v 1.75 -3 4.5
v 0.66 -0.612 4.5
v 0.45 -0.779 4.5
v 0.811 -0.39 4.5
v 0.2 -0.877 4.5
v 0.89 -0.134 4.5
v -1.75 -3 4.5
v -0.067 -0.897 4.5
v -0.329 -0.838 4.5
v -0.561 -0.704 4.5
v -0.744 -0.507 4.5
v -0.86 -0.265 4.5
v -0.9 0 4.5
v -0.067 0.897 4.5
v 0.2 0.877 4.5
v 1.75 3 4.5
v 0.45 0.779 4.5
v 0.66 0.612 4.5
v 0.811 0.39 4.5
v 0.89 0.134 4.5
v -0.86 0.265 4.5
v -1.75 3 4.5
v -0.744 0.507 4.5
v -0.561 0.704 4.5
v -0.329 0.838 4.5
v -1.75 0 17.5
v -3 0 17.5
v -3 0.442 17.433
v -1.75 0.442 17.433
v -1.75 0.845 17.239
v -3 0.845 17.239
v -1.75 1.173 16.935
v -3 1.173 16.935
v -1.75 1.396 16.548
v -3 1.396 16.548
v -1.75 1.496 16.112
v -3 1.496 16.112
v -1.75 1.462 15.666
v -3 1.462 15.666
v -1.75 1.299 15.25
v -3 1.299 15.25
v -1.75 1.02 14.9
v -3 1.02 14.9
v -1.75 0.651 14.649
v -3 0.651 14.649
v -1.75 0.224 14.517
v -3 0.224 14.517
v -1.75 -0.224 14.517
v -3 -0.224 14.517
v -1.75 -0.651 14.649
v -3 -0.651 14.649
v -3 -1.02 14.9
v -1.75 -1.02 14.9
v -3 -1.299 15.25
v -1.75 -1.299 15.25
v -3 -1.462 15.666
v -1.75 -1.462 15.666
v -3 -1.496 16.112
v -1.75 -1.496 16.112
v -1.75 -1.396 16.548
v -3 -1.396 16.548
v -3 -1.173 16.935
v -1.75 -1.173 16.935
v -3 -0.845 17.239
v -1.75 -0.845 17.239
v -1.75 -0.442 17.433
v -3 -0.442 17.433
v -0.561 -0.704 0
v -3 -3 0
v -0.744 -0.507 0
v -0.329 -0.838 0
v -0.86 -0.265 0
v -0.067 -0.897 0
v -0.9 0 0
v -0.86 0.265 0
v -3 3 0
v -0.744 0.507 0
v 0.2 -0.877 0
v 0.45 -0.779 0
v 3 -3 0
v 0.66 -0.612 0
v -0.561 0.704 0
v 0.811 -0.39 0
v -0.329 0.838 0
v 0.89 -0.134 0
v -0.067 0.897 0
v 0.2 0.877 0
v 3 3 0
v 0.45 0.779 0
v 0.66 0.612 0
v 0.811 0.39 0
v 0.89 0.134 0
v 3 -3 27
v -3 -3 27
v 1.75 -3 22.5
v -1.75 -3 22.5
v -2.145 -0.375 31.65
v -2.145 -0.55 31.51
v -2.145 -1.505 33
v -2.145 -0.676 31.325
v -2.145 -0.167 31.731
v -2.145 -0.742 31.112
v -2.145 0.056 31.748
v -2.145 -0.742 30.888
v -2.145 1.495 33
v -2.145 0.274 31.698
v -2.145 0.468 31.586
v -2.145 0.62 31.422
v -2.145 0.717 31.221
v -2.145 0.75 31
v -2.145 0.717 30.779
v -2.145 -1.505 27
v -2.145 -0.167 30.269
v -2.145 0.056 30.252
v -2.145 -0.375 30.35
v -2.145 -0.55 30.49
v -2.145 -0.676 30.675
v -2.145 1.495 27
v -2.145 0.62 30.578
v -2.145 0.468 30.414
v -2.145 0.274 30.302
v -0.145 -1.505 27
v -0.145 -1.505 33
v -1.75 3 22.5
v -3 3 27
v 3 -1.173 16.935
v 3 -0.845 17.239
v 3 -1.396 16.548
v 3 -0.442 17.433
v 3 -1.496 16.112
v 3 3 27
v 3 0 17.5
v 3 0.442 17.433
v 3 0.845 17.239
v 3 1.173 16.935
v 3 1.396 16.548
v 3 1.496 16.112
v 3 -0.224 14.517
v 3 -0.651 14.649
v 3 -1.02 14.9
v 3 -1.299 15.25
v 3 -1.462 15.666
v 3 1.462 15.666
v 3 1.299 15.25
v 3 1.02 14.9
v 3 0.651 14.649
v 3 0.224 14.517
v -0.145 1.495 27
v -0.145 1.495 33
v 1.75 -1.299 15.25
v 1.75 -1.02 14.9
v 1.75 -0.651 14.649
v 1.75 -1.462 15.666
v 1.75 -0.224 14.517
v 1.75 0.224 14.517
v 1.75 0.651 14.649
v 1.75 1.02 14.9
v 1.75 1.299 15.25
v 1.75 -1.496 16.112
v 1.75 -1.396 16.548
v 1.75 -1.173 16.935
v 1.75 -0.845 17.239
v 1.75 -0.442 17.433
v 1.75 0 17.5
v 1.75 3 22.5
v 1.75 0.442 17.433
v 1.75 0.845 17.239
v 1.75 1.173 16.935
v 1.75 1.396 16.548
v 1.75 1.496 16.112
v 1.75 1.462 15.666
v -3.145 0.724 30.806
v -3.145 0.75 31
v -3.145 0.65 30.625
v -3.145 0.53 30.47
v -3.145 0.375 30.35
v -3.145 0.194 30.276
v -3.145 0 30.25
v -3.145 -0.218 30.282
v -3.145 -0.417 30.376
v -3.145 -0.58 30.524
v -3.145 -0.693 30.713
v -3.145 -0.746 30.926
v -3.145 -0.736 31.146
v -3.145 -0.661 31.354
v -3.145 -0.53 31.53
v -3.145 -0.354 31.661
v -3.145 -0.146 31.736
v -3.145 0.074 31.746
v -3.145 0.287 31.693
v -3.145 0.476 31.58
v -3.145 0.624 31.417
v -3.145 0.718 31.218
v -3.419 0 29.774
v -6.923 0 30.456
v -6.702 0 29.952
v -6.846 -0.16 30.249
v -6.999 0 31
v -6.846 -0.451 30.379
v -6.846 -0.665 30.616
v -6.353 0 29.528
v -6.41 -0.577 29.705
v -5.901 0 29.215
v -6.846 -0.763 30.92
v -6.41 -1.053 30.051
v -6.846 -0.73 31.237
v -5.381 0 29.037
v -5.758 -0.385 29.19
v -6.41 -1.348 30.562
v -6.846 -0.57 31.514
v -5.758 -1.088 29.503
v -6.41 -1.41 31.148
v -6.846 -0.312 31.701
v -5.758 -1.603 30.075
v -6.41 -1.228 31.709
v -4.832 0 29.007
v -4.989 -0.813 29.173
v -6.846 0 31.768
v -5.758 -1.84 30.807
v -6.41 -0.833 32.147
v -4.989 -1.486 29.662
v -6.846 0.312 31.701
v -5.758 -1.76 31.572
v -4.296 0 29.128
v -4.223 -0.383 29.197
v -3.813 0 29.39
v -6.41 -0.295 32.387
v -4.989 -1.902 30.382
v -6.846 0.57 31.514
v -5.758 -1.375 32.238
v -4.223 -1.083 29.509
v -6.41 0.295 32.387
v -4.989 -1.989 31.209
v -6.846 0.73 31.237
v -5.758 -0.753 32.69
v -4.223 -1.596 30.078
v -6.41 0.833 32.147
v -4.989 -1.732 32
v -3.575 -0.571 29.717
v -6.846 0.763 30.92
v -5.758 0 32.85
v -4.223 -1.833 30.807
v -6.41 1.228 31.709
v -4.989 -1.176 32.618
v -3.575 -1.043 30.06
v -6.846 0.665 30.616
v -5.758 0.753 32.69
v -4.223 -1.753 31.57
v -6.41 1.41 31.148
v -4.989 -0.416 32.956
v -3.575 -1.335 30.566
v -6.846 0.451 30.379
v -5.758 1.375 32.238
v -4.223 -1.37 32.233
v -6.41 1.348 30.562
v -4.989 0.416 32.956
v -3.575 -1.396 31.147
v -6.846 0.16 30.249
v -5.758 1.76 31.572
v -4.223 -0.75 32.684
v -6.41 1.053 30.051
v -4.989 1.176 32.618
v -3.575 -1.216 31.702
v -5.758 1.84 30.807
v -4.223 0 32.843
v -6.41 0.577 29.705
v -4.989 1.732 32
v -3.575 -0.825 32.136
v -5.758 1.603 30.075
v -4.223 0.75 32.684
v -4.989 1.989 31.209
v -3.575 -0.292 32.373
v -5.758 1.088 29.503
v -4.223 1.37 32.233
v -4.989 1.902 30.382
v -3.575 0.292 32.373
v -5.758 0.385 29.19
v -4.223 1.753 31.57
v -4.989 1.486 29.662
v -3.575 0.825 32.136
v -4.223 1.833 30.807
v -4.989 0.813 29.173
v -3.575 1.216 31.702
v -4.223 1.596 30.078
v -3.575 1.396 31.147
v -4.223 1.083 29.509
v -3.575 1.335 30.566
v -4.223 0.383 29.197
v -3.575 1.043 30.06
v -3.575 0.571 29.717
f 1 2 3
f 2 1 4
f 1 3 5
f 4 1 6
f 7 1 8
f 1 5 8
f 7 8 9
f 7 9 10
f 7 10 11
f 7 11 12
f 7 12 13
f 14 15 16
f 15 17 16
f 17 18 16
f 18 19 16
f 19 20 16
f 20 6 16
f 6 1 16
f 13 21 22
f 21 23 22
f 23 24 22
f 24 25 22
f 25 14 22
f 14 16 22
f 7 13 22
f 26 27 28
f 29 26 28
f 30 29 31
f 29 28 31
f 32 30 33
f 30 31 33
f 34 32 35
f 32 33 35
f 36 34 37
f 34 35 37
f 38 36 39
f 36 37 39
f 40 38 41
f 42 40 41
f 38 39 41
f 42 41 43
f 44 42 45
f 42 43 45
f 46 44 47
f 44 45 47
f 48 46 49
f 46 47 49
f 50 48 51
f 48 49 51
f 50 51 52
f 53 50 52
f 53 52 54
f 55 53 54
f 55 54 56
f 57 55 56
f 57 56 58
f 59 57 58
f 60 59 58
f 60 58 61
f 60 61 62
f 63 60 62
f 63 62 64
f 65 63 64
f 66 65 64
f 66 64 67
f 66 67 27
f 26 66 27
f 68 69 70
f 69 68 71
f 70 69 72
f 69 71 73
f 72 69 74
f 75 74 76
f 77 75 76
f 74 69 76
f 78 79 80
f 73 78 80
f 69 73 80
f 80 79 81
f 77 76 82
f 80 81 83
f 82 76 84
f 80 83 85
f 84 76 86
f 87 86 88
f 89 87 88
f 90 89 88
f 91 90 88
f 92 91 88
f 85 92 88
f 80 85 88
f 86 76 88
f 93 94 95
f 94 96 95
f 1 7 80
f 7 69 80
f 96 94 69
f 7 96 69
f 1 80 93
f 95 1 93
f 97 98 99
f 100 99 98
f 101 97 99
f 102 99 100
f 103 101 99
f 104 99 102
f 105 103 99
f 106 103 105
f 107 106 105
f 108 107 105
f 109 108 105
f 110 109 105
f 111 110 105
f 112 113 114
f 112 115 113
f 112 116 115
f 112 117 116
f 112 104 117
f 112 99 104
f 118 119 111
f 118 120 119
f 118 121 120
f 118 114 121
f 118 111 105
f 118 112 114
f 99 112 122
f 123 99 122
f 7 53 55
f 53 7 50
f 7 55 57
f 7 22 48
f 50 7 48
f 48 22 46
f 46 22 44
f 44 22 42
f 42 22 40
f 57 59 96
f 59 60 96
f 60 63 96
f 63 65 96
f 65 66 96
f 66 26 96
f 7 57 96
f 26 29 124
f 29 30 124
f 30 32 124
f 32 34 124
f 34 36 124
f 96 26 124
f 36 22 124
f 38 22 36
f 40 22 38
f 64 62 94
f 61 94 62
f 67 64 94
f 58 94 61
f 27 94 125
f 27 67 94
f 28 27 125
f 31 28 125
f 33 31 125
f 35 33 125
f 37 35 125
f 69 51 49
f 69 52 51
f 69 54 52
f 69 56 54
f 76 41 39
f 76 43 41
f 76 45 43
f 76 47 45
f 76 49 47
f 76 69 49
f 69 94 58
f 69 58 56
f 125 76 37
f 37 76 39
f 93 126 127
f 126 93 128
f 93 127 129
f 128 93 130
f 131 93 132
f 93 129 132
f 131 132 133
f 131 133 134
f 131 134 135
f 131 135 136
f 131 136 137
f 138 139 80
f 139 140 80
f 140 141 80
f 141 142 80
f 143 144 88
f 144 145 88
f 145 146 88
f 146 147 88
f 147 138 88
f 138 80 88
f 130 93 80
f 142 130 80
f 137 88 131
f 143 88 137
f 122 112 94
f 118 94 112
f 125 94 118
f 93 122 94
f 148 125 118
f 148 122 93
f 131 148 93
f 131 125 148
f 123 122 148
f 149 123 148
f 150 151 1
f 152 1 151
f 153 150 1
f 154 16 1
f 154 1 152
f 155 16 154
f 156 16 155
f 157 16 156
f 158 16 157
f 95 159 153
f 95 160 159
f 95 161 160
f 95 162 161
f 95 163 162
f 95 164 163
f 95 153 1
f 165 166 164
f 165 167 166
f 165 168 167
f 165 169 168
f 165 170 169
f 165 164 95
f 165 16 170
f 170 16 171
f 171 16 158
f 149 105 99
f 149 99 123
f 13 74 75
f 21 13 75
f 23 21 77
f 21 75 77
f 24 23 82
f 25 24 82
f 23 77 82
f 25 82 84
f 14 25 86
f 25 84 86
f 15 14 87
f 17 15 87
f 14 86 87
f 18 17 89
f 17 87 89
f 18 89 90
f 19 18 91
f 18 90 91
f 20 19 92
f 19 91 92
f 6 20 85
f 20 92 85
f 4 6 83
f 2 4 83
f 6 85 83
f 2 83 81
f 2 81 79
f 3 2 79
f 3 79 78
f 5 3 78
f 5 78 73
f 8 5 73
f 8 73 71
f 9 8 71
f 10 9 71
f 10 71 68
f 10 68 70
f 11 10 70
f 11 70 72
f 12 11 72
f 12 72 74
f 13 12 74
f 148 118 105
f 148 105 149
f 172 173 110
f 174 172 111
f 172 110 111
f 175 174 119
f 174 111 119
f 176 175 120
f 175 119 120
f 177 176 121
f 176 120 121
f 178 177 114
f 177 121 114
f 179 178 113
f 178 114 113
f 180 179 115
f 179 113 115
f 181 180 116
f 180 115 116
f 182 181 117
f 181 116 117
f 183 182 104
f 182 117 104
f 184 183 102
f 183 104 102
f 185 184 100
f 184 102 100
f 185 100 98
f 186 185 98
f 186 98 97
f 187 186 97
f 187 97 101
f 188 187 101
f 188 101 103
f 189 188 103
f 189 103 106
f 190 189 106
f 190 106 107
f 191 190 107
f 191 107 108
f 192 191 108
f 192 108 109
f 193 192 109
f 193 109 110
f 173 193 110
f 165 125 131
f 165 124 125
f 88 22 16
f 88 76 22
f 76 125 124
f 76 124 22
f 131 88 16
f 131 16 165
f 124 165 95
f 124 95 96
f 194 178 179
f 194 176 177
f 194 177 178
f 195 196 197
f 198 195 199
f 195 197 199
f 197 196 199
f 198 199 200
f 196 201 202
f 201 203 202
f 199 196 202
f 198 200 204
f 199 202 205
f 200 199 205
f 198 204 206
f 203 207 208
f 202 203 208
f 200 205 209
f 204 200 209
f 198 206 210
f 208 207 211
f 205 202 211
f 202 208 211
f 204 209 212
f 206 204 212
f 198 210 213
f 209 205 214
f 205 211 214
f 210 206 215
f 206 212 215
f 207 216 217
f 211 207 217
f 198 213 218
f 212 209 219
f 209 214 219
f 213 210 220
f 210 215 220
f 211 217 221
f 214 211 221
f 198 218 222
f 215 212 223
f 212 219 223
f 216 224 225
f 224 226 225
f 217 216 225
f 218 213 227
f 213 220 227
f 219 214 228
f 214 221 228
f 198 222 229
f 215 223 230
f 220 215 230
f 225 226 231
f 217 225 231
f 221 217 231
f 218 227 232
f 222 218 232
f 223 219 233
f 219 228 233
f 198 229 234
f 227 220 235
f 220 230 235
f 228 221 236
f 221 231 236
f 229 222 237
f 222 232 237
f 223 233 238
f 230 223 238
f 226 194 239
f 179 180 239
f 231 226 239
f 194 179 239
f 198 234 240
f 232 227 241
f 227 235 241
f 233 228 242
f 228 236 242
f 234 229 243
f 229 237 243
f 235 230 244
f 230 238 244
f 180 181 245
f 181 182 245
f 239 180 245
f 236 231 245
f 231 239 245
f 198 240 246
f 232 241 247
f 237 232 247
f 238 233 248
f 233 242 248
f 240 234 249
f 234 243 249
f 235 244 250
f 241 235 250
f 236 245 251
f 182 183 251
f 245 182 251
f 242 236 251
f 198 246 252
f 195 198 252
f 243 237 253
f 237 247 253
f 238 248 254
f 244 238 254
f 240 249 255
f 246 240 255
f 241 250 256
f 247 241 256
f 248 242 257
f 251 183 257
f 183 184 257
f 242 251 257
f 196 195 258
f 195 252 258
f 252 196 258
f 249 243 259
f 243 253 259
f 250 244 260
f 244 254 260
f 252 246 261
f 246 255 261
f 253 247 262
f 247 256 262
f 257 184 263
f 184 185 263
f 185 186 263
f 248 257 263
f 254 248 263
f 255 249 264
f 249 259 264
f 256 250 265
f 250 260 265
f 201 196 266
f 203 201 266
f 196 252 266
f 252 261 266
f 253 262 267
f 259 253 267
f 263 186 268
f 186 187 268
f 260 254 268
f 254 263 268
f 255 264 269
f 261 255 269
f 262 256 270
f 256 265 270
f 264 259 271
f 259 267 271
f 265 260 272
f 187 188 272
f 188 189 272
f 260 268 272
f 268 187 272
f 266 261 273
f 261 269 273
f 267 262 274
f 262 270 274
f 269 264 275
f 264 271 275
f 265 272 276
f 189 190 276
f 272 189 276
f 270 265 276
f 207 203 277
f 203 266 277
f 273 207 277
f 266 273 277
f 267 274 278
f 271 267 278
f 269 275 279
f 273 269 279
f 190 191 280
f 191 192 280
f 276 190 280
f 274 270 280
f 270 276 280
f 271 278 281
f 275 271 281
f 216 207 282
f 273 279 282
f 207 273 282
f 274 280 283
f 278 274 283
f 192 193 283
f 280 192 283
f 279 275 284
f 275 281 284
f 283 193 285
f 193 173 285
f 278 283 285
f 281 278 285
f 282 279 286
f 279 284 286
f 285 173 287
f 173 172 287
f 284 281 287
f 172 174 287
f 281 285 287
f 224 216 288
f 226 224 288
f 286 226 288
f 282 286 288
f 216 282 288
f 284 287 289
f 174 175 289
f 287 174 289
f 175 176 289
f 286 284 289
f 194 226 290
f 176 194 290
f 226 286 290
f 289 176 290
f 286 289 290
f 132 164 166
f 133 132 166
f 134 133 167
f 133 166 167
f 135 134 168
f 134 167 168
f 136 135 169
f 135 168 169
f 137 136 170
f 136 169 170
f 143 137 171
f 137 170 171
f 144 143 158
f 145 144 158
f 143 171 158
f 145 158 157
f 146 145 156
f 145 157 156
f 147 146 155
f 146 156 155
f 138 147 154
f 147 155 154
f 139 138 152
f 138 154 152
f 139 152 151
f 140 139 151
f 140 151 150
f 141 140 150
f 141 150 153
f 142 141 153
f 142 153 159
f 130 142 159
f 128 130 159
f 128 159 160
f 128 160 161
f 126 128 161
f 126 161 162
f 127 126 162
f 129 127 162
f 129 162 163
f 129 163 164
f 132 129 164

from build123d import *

# Parameters (mm, degrees)
SKETCH_1_W          = 6
SKETCH_1_H          = 6
EXTRUDE_1_DEPTH     = 27
SKETCH_2_W          = 2
SKETCH_2_H          = 3
EXTRUDE_2_DEPTH     = 6
SKETCH_3_R          = 0.75
EXTRUDE_3_DEPTH     = 1
SKETCH_5_W          = 18
SKETCH_5_H          = 3.5
CUT_EXTRUDE_1_DEPTH = 8
SKETCH_6_R          = 1.5
CUT_EXTRUDE_2_DEPTH = 8
SKETCH_7_R          = 0.9
CUT_EXTRUDE_3_DEPTH = 8


with BuildPart() as part:
    # 草图1 → 凸台-拉伸1 (new body)
    with BuildSketch(Plane.XY):
        Rectangle(SKETCH_1_W, SKETCH_1_H)
    extrude(amount=EXTRUDE_1_DEPTH)

    # 草图2 → 凸台-拉伸2 (add)
    with BuildSketch(Plane.XY.offset(27)):
        with Locations((-1.14479355, -0.004540815)):
            Rectangle(SKETCH_2_W, SKETCH_2_H)
    extrude(amount=EXTRUDE_2_DEPTH)

    # 草图3 → 凸台-拉伸3 (add)
    with BuildSketch(Plane.ZY.offset(2.14479355)):
        with Locations(Location((31, 0, 0), (0, 0, 90))):
            Circle(SKETCH_3_R)
    extrude(amount=EXTRUDE_3_DEPTH)

    # 草图4 → 旋转1 (revolve)
    with BuildSketch(Plane(origin=(0, 0, 0), x_dir=(1, 0, 0), z_dir=(0, 1, 0))):
        with BuildLine():
            Line((-3.14479355, -31), (-6.998843172, -31))
            ThreePointArc((-6.998843172, -31), (-5.380877697, -29.036826645), (-3.14479355, -30.25))
            Line((-3.14479355, -30.25), (-3.14479355, -31))
        make_face()
    revolve(axis=Axis((-3.14479355, 0, 31), (-1, 0, 0)))

    # 草图5 → 切除-拉伸1 (cut)
    with BuildSketch(Plane(origin=(0.5, 3, 0), x_dir=(0, 0, 1), z_dir=(0, -1, 0))):
        with Locations((13.5, 0.5)):
            Rectangle(SKETCH_5_W, SKETCH_5_H)
    extrude(amount=CUT_EXTRUDE_1_DEPTH, mode=Mode.SUBTRACT)

    # 草图6 → 切除-拉伸2 (cut)
    with BuildSketch(Plane.ZY.offset(3)):
        with Locations((16, 0)):
            Circle(SKETCH_6_R)
    extrude(amount=-CUT_EXTRUDE_2_DEPTH, mode=Mode.SUBTRACT)

    # 草图7 → 切除-拉伸3 (cut)
    with BuildSketch(Plane(origin=(0, 0, 0), x_dir=(-1, 0, 0), z_dir=(0, 0, -1))):
        Circle(SKETCH_7_R)
    extrude(amount=-CUT_EXTRUDE_3_DEPTH, mode=Mode.SUBTRACT)


solid = part.part
